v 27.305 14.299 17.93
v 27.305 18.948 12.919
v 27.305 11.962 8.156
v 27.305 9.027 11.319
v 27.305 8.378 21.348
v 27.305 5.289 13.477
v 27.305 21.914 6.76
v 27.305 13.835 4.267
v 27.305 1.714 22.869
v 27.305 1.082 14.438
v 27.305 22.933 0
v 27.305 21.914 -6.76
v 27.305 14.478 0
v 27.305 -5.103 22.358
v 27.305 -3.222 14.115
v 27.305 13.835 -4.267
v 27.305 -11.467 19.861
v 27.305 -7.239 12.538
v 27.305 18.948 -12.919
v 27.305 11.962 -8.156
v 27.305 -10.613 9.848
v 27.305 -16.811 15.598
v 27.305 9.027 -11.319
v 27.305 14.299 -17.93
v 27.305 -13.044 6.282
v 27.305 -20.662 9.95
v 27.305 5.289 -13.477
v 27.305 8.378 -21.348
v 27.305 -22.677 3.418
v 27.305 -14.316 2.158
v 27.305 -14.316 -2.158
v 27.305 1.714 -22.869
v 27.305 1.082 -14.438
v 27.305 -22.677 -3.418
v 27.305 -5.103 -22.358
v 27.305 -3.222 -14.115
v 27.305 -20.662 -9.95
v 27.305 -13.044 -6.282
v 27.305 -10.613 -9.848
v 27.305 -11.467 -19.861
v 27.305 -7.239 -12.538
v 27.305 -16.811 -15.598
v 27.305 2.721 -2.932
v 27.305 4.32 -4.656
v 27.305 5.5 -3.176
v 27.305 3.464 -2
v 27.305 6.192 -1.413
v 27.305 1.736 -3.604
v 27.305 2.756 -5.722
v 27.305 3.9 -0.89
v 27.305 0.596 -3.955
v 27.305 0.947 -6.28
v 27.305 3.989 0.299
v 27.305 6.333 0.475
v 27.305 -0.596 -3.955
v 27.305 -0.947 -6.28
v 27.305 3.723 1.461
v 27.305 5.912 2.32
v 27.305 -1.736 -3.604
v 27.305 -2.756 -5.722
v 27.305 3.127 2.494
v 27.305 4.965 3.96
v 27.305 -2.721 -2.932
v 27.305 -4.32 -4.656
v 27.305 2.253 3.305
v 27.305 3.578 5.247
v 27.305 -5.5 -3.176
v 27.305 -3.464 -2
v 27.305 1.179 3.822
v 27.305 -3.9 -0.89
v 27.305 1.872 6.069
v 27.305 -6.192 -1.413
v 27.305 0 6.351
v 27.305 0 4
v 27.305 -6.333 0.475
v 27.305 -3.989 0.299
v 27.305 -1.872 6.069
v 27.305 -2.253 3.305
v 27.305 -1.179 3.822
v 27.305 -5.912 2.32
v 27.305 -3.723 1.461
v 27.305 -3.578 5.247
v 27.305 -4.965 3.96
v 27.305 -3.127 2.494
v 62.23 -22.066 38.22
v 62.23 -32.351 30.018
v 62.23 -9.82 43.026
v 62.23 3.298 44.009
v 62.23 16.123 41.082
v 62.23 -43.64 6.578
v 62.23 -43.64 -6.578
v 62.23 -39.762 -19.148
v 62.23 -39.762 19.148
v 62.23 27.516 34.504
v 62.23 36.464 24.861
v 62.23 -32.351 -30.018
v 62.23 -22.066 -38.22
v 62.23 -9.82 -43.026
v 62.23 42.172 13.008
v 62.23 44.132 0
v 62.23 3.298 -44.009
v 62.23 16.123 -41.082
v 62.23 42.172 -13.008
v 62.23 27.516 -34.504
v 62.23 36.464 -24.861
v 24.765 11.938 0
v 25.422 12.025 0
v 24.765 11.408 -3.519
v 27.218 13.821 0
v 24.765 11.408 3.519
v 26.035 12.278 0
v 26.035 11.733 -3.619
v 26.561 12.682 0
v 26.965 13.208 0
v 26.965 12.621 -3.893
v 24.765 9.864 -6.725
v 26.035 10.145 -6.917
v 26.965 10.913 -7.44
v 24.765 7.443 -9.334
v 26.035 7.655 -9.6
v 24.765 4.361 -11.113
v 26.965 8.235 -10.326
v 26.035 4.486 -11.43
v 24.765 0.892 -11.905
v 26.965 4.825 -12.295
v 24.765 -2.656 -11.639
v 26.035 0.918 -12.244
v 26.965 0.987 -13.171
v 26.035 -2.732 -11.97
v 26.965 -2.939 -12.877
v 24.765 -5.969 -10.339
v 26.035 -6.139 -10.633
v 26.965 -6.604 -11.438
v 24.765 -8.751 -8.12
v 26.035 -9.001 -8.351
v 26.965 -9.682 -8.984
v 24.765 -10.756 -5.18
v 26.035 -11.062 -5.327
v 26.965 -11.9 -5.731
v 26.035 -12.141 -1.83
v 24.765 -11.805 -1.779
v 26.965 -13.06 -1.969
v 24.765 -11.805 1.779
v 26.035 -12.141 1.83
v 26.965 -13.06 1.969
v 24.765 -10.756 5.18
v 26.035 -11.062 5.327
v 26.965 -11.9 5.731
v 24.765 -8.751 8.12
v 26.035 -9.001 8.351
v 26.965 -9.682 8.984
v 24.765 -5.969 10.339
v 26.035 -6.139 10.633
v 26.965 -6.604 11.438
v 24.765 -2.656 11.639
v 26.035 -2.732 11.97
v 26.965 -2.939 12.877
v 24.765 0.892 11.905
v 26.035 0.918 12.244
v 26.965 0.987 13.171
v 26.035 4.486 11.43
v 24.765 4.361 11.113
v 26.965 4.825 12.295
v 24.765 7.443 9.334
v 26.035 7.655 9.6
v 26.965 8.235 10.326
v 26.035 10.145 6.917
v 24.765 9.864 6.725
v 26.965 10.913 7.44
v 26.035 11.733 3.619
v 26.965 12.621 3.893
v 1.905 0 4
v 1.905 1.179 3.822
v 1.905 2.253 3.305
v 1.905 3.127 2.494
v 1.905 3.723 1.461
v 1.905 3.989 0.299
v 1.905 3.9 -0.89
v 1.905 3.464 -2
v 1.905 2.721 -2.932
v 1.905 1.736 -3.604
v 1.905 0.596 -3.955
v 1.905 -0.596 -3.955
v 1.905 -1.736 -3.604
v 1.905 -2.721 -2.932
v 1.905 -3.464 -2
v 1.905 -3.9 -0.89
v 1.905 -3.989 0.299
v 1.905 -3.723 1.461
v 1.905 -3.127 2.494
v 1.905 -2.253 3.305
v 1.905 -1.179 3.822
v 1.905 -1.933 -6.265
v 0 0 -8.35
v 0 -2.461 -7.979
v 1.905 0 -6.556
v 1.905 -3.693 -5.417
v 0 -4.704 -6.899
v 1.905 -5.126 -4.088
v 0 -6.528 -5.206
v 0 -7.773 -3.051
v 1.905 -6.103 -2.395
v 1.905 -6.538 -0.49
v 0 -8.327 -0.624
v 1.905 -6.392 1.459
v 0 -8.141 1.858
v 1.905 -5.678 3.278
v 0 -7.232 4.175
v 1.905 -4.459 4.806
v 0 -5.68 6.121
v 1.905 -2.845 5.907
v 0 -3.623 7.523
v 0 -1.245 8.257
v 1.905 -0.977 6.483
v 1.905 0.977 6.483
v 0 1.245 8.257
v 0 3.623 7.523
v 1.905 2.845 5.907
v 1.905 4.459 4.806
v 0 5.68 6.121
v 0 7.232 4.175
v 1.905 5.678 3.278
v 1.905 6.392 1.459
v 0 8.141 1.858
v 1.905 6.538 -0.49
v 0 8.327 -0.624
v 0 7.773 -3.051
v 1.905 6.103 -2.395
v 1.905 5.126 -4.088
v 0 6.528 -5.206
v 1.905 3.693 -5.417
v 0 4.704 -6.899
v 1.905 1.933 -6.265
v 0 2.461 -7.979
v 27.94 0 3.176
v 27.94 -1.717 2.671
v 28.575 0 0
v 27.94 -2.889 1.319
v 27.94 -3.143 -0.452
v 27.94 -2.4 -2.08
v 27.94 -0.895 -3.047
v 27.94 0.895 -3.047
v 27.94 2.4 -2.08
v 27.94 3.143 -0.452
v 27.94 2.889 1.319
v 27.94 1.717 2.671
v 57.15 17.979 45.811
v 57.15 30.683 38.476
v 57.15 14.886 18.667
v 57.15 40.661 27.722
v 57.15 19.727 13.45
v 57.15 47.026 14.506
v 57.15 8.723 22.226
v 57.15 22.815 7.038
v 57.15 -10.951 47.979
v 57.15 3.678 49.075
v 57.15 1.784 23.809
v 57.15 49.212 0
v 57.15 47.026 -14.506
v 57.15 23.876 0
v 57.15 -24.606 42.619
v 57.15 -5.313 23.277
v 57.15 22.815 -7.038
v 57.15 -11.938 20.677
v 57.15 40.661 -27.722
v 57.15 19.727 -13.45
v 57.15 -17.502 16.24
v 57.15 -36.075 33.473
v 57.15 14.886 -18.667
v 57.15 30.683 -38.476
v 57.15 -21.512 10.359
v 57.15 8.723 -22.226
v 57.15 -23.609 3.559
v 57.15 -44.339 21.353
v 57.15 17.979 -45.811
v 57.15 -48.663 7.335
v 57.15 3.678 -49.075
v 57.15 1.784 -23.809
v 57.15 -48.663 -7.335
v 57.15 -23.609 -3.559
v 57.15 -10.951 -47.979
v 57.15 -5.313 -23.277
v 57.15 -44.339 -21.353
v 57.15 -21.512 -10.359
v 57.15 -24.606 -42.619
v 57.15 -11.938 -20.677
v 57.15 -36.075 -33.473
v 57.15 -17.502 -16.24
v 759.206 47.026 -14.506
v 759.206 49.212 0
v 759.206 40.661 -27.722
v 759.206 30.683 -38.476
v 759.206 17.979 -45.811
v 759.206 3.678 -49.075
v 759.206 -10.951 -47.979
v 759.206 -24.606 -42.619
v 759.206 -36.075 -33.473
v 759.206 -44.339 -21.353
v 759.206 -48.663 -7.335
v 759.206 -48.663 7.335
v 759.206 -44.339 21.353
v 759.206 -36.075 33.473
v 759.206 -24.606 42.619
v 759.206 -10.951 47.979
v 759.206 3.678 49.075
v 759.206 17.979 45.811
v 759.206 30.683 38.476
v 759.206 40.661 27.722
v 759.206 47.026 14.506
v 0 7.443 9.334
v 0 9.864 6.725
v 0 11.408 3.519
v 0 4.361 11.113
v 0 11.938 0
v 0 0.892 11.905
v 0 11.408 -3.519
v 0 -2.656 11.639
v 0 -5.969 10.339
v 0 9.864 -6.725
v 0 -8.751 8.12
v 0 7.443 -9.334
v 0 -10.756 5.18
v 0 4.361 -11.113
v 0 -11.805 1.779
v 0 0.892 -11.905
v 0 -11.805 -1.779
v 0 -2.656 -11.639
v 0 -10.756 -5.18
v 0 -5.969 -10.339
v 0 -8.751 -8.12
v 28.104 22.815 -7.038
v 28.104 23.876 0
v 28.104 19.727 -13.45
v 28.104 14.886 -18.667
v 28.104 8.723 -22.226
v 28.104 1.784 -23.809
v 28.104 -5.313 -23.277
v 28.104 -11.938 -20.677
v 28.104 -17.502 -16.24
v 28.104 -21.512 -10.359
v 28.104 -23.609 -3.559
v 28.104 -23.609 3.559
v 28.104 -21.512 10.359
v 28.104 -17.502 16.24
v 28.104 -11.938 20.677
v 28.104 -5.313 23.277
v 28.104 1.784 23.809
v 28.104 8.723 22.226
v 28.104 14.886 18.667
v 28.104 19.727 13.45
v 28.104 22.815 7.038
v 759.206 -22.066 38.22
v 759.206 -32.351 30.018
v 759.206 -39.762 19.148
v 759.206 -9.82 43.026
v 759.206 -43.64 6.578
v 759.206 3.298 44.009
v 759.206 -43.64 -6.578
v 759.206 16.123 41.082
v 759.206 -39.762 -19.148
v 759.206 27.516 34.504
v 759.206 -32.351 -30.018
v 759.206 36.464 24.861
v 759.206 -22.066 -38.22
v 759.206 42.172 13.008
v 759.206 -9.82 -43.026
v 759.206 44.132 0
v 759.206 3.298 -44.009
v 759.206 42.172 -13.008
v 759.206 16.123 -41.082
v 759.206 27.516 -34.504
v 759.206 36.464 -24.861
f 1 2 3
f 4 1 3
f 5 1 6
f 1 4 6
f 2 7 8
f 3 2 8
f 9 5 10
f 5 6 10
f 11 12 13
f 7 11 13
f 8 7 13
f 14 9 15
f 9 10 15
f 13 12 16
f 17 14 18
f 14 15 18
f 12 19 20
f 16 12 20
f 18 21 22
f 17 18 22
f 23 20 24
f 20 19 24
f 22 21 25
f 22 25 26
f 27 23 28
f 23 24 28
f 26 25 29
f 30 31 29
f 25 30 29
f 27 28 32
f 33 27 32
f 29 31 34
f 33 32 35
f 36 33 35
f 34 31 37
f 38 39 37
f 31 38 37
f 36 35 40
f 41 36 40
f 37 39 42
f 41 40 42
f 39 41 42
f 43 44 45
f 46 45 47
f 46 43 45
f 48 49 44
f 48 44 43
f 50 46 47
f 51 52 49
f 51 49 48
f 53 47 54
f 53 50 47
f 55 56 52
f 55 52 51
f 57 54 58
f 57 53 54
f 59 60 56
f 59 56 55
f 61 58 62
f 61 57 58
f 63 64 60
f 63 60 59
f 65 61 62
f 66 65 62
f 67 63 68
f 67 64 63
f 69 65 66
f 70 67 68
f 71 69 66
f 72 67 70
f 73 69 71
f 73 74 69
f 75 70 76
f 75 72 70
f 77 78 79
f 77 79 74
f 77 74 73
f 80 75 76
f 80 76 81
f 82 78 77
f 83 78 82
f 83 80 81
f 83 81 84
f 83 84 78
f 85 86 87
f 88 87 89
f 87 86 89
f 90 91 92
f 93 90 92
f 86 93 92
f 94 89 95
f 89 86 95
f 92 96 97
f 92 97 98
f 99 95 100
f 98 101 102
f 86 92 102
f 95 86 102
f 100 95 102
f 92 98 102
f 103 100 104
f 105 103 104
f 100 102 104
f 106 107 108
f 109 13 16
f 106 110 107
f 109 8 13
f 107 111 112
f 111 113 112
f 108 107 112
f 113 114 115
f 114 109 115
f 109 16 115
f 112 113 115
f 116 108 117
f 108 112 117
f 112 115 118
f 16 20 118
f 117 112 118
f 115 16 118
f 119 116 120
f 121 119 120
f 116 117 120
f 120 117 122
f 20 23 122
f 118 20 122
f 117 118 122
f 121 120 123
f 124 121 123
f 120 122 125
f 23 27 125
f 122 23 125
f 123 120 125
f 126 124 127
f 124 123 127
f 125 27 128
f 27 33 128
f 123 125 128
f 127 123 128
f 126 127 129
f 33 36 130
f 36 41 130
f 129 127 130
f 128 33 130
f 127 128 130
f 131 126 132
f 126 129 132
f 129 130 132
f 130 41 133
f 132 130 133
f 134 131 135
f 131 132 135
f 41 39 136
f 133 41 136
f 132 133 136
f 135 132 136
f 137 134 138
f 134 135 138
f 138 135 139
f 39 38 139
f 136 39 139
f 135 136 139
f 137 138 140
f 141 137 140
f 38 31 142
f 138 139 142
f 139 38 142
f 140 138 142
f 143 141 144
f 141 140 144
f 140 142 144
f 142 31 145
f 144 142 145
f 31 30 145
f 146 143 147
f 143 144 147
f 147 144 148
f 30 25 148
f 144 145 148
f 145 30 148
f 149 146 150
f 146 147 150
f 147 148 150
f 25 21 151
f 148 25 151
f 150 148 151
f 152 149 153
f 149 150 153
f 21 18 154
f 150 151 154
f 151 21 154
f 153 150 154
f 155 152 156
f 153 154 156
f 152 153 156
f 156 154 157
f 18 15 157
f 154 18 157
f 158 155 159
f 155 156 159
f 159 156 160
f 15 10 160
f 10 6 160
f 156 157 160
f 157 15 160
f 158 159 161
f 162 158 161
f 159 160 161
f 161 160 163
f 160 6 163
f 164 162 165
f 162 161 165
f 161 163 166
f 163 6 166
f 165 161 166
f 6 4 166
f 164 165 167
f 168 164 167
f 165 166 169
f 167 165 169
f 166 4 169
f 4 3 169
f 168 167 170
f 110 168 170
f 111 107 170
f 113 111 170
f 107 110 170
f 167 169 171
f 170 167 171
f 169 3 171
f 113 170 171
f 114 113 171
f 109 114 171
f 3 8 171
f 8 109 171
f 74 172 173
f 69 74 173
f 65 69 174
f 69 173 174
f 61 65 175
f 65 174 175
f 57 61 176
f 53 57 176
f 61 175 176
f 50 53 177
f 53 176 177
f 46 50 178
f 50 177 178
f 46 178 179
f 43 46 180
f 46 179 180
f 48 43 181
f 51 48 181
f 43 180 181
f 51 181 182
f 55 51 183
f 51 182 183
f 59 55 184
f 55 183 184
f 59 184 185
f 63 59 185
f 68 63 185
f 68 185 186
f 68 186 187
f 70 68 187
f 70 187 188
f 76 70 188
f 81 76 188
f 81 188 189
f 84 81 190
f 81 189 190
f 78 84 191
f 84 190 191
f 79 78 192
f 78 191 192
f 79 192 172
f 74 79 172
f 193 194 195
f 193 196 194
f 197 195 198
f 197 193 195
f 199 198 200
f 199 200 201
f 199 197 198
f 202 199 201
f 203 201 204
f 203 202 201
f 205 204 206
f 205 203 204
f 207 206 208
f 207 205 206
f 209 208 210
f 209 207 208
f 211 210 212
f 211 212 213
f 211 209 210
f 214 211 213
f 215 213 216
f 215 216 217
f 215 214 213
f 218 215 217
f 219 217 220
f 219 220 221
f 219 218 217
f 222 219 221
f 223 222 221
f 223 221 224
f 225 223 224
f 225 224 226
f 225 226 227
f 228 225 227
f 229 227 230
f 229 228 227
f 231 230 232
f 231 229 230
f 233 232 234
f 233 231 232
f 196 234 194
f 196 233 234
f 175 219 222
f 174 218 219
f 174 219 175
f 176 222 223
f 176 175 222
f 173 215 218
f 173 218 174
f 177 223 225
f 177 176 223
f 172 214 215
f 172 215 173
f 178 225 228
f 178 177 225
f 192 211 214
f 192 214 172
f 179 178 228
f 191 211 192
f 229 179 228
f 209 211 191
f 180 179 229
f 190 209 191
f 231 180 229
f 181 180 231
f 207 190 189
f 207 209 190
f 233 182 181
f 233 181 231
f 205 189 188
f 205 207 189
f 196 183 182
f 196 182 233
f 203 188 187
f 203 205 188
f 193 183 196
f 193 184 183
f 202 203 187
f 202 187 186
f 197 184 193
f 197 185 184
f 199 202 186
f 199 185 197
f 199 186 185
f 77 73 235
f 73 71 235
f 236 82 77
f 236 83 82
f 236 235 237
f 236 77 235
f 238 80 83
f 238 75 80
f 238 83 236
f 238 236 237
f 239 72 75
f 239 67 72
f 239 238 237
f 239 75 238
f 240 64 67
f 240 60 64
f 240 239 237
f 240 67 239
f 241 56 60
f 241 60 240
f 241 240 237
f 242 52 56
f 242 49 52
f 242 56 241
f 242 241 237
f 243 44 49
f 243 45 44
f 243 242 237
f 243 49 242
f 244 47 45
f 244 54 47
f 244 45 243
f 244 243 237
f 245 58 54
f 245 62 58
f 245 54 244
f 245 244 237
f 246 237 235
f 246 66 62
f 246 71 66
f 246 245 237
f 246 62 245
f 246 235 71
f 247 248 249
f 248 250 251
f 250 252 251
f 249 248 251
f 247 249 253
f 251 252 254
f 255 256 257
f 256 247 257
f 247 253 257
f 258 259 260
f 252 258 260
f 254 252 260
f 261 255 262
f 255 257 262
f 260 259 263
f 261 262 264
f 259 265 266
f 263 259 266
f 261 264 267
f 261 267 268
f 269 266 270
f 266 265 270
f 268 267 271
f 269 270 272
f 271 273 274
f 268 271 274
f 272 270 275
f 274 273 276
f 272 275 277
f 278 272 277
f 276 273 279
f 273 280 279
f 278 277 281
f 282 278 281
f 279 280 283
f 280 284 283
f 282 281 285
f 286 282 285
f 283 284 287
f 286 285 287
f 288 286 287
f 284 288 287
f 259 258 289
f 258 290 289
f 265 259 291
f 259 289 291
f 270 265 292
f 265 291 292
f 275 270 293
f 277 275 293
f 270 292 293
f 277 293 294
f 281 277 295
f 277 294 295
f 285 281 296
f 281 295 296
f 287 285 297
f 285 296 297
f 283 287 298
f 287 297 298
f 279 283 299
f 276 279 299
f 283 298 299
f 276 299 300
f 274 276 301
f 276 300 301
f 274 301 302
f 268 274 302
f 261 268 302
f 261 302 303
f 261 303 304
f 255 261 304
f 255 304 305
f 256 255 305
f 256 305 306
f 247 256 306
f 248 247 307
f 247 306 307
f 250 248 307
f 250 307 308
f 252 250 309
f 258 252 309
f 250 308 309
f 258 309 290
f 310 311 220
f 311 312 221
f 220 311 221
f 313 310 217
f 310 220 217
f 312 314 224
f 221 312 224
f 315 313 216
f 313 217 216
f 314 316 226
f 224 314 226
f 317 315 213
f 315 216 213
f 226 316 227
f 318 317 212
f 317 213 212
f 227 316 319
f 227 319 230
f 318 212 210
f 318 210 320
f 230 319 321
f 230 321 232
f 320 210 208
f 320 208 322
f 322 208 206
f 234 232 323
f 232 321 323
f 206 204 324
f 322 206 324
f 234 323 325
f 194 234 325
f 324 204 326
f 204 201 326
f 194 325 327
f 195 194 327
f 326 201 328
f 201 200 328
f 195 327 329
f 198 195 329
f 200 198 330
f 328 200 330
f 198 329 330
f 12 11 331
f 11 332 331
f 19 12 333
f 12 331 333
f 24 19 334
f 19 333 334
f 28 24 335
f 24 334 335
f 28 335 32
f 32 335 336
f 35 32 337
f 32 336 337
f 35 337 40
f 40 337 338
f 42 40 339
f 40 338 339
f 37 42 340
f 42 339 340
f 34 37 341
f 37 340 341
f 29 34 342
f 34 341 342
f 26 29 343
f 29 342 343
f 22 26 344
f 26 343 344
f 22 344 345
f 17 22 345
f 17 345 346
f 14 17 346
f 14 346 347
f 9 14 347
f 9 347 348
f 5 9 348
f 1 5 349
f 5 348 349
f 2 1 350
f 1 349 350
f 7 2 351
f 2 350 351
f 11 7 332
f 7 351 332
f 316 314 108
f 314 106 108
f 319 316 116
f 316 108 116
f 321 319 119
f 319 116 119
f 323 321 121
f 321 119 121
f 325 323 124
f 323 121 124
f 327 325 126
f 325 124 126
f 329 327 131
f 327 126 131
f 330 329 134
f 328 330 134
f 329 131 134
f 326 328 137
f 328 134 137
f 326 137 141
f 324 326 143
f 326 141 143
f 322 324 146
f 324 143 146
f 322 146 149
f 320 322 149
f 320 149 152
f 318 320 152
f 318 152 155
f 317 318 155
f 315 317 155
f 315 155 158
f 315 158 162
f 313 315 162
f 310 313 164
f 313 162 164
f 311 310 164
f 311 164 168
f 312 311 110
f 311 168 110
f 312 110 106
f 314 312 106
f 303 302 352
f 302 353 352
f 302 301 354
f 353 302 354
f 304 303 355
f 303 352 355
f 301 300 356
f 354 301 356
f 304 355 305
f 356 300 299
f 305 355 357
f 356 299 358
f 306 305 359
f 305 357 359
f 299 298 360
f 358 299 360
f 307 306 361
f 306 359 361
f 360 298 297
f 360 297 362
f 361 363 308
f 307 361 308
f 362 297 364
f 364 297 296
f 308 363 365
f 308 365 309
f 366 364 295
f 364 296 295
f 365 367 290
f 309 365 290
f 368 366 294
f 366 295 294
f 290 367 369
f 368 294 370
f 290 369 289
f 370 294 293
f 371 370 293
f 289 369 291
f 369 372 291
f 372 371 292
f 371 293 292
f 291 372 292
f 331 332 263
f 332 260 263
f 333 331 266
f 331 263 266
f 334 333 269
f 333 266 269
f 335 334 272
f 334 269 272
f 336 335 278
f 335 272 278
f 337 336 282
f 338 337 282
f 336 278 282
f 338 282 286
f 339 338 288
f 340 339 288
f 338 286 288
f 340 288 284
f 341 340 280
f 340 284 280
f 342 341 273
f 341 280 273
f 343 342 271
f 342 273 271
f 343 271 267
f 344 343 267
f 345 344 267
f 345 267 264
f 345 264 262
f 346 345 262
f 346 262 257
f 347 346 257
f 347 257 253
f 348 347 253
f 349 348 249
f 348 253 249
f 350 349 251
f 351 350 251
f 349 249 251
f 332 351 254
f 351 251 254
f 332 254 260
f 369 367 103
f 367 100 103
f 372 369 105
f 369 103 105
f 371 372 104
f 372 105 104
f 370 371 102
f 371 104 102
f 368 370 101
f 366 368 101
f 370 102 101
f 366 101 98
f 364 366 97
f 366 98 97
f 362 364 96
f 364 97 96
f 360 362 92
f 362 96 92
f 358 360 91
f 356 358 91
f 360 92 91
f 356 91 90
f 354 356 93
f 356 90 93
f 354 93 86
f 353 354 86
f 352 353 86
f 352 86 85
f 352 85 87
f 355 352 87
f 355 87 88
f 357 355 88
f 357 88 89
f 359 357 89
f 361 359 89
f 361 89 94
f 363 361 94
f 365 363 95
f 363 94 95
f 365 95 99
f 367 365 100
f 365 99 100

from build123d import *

# Parameters (mm, degrees)
SKETCH19_R         = 4
CUT_EXTRUDE3_DEPTH = 25.4


with BuildPart() as part:
    # Sketch1 → Revolve1 (revolve)
    with BuildSketch(Plane.XY):
        with BuildLine():
            Line((0, 0), (0, 11.938))
            Line((0, 11.938), (24.765, 11.938))
            ThreePointArc((24.765, 11.938), (26.561051224, 12.681948776), (27.305, 14.478))
            Line((27.305, 14.478), (27.305, 22.933028409))
            Line((27.305, 22.933028409), (28.104406531, 23.876))
            Line((28.104406531, 23.876), (57.15, 23.876))
            Line((57.15, 23.876), (57.15, 49.2125))
            Line((57.15, 49.2125), (759.206, 49.2125))
            Line((759.206, 49.2125), (759.206, 44.1325))
            Line((759.206, 44.1325), (62.23, 44.1325))
            Line((62.23, 44.1325), (62.23, 0))
            Line((62.23, 0), (0, 0))
        make_face()
    revolve(axis=Axis((62.23, 0, 0), (-1, 0, 0)))

    # Sketch16 → Cut-Revolve1 (revolve, cut)
    with BuildSketch(Plane(origin=(0, 0, 0), x_dir=(1, 0, 0), z_dir=(0, 1, 0))):
        Polygon((0, 0), (0, 8.35025), (1.905, 6.556375), (1.905, 0), align=None)
    revolve(axis=Axis((1.905, 0, 0), (-1, 0, 0)), mode=Mode.SUBTRACT)

    # Sketch19 → Cut-Extrude3 (cut)
    with BuildSketch(Plane.ZY.offset(-1.905)):
        Circle(SKETCH19_R)
    extrude(amount=-CUT_EXTRUDE3_DEPTH, mode=Mode.SUBTRACT)

    # Sketch32 → Cut-Revolve6 (revolve, cut)
    with BuildSketch(Plane(origin=(0, 0, 0), x_dir=(1, 0, 0), z_dir=(0, 1, 0)), mode=Mode.PRIVATE) as cut_revolve6_sk:
        Polygon((27.305, 0), (28.575, 0), (27.305, 6.351059428), align=None)
    revolve(cut_revolve6_sk.sketch.rotate(Axis((27.305, 0, 0), (1, 0, 0)), 180), axis=Axis((27.305, 0, 0), (1, 0, 0)), mode=Mode.SUBTRACT)


solid = part.part
